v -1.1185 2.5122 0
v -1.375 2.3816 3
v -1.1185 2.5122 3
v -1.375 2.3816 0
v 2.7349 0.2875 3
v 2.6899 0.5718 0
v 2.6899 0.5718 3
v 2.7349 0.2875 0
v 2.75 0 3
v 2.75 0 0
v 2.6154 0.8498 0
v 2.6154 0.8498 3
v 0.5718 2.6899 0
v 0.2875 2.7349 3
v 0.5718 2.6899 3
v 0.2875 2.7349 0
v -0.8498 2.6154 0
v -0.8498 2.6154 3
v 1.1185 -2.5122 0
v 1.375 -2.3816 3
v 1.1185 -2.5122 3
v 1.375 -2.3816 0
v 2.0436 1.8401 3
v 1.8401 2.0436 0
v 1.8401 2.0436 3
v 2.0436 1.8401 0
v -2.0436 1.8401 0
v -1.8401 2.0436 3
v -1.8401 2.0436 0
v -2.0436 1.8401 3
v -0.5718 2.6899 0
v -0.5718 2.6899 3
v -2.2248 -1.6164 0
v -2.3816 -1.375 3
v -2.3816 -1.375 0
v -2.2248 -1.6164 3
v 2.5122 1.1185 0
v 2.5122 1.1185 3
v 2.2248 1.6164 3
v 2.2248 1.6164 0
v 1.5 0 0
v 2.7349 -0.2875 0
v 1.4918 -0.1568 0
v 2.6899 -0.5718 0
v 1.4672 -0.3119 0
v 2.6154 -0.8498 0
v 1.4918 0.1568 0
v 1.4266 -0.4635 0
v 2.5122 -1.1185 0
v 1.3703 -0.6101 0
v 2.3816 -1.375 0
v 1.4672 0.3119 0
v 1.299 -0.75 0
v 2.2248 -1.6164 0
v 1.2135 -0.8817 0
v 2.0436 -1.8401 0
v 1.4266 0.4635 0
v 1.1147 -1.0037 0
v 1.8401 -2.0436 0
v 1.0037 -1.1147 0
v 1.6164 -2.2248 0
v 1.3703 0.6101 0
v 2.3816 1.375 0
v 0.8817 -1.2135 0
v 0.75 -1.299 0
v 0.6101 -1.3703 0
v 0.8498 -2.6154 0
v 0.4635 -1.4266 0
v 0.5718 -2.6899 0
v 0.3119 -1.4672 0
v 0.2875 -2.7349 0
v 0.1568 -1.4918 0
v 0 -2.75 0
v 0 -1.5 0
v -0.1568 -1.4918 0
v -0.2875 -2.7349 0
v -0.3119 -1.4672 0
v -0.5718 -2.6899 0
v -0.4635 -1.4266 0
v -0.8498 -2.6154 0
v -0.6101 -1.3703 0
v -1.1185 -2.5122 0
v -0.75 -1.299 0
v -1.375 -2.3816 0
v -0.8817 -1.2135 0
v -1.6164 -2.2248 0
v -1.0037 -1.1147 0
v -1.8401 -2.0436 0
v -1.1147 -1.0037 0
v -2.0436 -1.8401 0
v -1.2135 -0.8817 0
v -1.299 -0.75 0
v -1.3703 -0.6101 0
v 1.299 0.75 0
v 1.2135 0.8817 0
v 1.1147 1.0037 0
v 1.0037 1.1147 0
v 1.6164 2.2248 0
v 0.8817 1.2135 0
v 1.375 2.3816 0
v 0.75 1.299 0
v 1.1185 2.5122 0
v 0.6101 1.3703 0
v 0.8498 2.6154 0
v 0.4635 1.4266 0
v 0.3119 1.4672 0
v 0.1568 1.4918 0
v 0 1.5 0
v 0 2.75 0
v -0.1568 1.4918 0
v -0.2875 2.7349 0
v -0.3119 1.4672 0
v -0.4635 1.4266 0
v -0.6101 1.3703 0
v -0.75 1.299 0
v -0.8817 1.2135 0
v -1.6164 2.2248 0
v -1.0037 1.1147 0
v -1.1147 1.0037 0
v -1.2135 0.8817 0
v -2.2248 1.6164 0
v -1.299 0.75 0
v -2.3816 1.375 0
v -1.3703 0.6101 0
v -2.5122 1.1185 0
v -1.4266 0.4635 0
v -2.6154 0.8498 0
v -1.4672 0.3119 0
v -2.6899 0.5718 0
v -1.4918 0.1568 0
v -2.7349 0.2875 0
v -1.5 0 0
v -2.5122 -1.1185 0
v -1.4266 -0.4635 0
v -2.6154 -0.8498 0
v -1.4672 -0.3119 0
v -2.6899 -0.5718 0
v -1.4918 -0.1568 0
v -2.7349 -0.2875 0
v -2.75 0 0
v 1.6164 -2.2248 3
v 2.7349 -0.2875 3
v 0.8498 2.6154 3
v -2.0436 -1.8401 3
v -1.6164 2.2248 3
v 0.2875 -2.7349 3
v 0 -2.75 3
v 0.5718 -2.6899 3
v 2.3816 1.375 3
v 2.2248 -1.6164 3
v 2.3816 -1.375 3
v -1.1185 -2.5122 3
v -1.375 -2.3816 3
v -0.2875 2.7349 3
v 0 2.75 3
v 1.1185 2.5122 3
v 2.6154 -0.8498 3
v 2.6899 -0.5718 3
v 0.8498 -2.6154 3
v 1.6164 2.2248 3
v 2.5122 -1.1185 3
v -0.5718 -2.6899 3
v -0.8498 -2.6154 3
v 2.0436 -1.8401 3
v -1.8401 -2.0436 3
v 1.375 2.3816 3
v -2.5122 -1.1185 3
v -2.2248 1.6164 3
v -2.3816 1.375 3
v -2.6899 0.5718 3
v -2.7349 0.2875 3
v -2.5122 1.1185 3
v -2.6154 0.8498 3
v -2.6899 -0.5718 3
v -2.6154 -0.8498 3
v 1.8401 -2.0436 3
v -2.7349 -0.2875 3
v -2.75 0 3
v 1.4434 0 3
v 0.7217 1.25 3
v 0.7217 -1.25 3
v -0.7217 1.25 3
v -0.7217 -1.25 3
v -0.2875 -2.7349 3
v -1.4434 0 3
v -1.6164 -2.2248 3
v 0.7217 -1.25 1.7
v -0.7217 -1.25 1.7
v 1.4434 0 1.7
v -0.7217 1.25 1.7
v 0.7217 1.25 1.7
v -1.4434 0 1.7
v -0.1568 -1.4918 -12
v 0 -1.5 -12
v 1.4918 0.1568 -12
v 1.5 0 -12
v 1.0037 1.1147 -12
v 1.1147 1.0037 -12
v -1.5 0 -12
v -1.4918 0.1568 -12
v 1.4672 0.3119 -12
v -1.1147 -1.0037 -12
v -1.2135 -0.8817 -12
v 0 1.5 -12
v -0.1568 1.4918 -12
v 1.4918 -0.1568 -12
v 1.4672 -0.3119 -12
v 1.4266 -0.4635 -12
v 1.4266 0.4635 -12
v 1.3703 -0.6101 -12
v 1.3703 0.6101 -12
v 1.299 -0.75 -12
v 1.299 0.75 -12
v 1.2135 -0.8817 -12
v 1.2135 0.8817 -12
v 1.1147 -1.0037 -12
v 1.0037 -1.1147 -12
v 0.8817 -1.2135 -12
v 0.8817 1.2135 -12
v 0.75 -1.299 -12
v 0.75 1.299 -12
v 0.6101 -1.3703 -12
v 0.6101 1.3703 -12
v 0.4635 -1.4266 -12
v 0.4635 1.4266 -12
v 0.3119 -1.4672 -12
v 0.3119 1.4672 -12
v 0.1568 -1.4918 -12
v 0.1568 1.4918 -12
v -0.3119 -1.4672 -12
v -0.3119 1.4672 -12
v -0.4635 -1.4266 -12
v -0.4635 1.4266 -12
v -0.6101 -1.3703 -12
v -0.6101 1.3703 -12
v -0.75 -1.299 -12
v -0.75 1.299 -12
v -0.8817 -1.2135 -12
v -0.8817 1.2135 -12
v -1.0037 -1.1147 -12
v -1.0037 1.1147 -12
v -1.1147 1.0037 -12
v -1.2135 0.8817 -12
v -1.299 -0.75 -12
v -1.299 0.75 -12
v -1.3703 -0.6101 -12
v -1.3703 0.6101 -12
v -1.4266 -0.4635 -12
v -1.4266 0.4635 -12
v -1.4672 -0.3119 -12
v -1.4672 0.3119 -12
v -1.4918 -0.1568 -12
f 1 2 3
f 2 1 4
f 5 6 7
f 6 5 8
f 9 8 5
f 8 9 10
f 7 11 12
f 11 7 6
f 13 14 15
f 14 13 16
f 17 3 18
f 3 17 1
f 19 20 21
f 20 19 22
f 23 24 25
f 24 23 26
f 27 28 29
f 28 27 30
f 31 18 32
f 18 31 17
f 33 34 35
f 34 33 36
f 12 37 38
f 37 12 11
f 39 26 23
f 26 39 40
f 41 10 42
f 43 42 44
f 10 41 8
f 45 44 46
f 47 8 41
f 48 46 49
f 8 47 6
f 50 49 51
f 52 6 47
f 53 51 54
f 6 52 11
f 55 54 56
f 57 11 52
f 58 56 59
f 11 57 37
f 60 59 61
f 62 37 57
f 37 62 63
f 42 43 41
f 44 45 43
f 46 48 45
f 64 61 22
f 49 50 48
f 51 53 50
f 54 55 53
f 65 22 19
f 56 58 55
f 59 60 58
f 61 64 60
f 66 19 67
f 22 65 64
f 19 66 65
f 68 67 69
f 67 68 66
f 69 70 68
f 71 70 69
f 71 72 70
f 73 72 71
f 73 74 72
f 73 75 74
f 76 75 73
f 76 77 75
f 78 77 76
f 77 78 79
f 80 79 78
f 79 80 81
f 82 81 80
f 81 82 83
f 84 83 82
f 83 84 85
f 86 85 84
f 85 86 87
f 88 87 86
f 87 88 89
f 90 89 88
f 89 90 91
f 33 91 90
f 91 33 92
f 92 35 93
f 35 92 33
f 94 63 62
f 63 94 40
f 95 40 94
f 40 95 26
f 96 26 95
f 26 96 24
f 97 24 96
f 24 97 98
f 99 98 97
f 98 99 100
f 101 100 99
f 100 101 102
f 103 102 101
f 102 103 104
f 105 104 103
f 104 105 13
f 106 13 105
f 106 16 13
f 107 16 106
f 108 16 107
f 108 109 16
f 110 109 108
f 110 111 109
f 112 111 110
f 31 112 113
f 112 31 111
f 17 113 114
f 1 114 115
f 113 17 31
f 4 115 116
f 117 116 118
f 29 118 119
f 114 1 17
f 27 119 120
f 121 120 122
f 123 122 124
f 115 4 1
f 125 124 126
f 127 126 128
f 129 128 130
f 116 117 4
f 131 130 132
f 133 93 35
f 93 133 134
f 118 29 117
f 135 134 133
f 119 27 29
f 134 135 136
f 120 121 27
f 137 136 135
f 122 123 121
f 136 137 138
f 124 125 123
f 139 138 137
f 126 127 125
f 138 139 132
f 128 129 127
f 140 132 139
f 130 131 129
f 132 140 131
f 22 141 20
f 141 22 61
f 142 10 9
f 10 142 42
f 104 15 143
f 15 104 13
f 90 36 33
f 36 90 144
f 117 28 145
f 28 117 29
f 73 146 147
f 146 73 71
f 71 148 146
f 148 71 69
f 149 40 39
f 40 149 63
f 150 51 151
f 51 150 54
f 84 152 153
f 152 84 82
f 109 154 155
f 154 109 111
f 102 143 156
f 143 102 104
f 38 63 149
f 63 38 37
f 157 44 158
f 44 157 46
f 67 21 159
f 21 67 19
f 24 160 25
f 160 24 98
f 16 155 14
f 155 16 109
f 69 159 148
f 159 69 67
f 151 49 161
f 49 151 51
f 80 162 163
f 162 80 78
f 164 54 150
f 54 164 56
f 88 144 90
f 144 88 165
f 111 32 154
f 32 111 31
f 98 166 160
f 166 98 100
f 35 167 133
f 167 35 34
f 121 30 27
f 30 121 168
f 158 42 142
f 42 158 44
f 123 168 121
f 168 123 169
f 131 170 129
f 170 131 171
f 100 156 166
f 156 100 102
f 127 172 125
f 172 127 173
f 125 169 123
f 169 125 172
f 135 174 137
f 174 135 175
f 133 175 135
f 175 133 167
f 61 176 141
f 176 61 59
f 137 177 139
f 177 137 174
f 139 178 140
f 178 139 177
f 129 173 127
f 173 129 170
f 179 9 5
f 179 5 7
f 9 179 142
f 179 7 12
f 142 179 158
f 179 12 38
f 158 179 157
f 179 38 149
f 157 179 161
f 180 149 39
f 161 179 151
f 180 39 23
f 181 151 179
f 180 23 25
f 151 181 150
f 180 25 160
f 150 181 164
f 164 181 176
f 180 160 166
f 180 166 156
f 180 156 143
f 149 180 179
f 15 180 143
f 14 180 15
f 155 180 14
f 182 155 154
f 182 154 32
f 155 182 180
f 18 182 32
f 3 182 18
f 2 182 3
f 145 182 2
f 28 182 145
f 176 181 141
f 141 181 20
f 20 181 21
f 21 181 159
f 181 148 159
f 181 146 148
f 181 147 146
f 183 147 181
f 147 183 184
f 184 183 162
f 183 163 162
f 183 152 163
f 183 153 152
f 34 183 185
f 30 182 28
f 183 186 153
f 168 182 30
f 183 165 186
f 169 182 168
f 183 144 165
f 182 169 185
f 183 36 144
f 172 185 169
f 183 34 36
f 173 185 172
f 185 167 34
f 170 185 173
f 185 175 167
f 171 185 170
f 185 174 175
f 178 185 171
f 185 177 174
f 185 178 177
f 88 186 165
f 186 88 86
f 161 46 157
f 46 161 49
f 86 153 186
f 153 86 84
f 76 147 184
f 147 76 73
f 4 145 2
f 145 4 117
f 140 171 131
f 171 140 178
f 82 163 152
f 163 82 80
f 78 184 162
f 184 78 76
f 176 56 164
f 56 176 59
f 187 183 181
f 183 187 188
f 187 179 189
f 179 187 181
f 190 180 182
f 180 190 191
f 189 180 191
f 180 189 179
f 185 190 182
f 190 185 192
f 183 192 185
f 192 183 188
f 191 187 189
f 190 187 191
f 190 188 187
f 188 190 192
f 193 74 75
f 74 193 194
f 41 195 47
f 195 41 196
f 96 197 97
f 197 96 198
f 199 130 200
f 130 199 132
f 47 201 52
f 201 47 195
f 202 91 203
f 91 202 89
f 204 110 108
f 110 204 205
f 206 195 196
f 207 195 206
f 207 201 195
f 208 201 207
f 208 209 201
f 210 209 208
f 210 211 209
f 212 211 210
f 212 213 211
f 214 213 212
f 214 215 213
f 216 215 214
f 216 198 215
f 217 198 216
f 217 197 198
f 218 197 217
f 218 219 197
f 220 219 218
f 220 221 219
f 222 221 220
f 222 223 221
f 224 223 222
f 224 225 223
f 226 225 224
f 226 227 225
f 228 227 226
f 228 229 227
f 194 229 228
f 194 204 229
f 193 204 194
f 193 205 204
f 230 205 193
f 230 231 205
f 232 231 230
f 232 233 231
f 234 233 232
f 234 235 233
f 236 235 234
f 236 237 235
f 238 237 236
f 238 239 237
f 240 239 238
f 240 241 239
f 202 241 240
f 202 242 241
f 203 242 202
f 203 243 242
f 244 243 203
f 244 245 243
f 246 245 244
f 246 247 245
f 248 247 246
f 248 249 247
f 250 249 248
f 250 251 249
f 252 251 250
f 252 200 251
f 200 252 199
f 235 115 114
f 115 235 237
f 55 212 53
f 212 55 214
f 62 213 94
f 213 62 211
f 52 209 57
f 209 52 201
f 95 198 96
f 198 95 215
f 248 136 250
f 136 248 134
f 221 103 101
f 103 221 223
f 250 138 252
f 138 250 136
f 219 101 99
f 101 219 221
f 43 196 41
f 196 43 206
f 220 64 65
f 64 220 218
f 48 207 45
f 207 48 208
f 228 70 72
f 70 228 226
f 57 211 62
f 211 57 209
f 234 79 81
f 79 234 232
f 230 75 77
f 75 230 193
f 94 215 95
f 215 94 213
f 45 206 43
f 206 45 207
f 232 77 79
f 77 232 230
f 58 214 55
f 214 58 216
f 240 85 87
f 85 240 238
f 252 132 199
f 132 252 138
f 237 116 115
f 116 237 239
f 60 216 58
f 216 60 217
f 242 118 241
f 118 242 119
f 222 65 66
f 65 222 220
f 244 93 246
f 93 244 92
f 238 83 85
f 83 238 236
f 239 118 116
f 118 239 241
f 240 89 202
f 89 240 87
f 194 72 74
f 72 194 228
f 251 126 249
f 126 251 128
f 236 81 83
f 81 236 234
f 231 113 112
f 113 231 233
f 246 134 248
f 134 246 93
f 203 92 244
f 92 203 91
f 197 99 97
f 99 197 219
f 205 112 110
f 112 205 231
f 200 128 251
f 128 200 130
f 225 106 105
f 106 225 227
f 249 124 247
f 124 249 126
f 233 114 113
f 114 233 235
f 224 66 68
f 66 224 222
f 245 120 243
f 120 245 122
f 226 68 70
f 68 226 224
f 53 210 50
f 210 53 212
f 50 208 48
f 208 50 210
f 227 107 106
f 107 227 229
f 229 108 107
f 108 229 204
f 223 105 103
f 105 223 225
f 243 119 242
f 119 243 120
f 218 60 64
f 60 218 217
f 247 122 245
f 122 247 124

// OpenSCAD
// file: data-access.scad
// Norm Nuts and Bolts - a OpenSCAD library
// Copyright (C) 2012  Johannes Kneer

// This program is free software: you can redistribute it and/or modify
// it under the terms of the GNU General Public License as published by
// the Free Software Foundation, either version 3 of the License, or
// (at your option) any later version.

// This program is distributed in the hope that it will be useful,
// but WITHOUT ANY WARRANTY; without even the implied warranty of
// MERCHANTABILITY or FITNESS FOR A PARTICULAR PURPOSE.  See the
// GNU General Public License for more details.

// You should have received a copy of the GNU General Public License
// along with this program.  If not, see <http://www.gnu.org/licenses/>.


// DATABASE ACCESS FUNCTIONS AND CONSTANTS



// == CONSTANTS == 

// screw table access keys
_NB_S_DESC            = 0;
_NB_S_FAMKEY			 = 1;
_NB_S_LENGTH          = 2;
_NB_S_NOTHREAD_LENGTH = 3;

_NB_F_DESC			 = 0;
_NB_F_OUTER_DIA       = 1;
_NB_F_INNER_DIA       = 2;
_NB_F_LEAD            = 3; 
_NB_F_KEY             = 4;
_NB_F_KEY_DEPTH       = 5;
_NB_F_HEAD_HEIGHT     = 6;
_NB_F_HEAD_DIA        = 7;
_NB_F_NUT_KEY         = 8;
_NB_F_NUT_HEIGHT      = 9;


// == FUNCTIONS ==

// _get_screw("descriptor")   with descriptor = M8x25
//   find the line for a general object in the data matrix

function _get_screw(n) = data_screw[search([n], data_screw)[0]];
function _get_screw_fam(n) = data_screw_fam[search([_get_screw(n)[_NB_S_FAMKEY]], data_screw_fam)[0]];

function _get_fam(n) = data_screw_fam[search([n], data_screw_fam)[0]];


// _get_XXXXX("descriptor") functions
// find a single property in the database

function _get_desc(n)        = _get_screw(n)[_NB_S_DESC];
function _get_famkey(n)         = _get_screw(n)[_NB_S_FAMKEY];
function _get_length(n)      = _get_screw(n)[_NB_S_LENGTH];
function _get_nt_length(n)   = _get_screw(n)[_NB_S_NOTHREAD_LENGTH];

function _get_outer_dia(n)   = _get_screw_fam(n)[_NB_F_OUTER_DIA];
function _get_inner_dia(n)   = _get_screw_fam(n)[_NB_F_INNER_DIA];
function _get_lead(n)        = _get_screw_fam(n)[_NB_F_LEAD];
function _get_head_height(n) = _get_screw_fam(n)[_NB_F_HEAD_HEIGHT];
function _get_head_dia(n)    = _get_screw_fam(n)[_NB_F_HEAD_DIA];
function _get_nut_key(n)     = _get_screw_fam(n)[_NB_F_NUT_KEY];
function _get_nut_height(n)  = _get_screw_fam(n)[_NB_F_NUT_HEIGHT];
// main file
include <cyl_head_bolt.scad>;
$fn=60;		    
screw("M3x12");    
